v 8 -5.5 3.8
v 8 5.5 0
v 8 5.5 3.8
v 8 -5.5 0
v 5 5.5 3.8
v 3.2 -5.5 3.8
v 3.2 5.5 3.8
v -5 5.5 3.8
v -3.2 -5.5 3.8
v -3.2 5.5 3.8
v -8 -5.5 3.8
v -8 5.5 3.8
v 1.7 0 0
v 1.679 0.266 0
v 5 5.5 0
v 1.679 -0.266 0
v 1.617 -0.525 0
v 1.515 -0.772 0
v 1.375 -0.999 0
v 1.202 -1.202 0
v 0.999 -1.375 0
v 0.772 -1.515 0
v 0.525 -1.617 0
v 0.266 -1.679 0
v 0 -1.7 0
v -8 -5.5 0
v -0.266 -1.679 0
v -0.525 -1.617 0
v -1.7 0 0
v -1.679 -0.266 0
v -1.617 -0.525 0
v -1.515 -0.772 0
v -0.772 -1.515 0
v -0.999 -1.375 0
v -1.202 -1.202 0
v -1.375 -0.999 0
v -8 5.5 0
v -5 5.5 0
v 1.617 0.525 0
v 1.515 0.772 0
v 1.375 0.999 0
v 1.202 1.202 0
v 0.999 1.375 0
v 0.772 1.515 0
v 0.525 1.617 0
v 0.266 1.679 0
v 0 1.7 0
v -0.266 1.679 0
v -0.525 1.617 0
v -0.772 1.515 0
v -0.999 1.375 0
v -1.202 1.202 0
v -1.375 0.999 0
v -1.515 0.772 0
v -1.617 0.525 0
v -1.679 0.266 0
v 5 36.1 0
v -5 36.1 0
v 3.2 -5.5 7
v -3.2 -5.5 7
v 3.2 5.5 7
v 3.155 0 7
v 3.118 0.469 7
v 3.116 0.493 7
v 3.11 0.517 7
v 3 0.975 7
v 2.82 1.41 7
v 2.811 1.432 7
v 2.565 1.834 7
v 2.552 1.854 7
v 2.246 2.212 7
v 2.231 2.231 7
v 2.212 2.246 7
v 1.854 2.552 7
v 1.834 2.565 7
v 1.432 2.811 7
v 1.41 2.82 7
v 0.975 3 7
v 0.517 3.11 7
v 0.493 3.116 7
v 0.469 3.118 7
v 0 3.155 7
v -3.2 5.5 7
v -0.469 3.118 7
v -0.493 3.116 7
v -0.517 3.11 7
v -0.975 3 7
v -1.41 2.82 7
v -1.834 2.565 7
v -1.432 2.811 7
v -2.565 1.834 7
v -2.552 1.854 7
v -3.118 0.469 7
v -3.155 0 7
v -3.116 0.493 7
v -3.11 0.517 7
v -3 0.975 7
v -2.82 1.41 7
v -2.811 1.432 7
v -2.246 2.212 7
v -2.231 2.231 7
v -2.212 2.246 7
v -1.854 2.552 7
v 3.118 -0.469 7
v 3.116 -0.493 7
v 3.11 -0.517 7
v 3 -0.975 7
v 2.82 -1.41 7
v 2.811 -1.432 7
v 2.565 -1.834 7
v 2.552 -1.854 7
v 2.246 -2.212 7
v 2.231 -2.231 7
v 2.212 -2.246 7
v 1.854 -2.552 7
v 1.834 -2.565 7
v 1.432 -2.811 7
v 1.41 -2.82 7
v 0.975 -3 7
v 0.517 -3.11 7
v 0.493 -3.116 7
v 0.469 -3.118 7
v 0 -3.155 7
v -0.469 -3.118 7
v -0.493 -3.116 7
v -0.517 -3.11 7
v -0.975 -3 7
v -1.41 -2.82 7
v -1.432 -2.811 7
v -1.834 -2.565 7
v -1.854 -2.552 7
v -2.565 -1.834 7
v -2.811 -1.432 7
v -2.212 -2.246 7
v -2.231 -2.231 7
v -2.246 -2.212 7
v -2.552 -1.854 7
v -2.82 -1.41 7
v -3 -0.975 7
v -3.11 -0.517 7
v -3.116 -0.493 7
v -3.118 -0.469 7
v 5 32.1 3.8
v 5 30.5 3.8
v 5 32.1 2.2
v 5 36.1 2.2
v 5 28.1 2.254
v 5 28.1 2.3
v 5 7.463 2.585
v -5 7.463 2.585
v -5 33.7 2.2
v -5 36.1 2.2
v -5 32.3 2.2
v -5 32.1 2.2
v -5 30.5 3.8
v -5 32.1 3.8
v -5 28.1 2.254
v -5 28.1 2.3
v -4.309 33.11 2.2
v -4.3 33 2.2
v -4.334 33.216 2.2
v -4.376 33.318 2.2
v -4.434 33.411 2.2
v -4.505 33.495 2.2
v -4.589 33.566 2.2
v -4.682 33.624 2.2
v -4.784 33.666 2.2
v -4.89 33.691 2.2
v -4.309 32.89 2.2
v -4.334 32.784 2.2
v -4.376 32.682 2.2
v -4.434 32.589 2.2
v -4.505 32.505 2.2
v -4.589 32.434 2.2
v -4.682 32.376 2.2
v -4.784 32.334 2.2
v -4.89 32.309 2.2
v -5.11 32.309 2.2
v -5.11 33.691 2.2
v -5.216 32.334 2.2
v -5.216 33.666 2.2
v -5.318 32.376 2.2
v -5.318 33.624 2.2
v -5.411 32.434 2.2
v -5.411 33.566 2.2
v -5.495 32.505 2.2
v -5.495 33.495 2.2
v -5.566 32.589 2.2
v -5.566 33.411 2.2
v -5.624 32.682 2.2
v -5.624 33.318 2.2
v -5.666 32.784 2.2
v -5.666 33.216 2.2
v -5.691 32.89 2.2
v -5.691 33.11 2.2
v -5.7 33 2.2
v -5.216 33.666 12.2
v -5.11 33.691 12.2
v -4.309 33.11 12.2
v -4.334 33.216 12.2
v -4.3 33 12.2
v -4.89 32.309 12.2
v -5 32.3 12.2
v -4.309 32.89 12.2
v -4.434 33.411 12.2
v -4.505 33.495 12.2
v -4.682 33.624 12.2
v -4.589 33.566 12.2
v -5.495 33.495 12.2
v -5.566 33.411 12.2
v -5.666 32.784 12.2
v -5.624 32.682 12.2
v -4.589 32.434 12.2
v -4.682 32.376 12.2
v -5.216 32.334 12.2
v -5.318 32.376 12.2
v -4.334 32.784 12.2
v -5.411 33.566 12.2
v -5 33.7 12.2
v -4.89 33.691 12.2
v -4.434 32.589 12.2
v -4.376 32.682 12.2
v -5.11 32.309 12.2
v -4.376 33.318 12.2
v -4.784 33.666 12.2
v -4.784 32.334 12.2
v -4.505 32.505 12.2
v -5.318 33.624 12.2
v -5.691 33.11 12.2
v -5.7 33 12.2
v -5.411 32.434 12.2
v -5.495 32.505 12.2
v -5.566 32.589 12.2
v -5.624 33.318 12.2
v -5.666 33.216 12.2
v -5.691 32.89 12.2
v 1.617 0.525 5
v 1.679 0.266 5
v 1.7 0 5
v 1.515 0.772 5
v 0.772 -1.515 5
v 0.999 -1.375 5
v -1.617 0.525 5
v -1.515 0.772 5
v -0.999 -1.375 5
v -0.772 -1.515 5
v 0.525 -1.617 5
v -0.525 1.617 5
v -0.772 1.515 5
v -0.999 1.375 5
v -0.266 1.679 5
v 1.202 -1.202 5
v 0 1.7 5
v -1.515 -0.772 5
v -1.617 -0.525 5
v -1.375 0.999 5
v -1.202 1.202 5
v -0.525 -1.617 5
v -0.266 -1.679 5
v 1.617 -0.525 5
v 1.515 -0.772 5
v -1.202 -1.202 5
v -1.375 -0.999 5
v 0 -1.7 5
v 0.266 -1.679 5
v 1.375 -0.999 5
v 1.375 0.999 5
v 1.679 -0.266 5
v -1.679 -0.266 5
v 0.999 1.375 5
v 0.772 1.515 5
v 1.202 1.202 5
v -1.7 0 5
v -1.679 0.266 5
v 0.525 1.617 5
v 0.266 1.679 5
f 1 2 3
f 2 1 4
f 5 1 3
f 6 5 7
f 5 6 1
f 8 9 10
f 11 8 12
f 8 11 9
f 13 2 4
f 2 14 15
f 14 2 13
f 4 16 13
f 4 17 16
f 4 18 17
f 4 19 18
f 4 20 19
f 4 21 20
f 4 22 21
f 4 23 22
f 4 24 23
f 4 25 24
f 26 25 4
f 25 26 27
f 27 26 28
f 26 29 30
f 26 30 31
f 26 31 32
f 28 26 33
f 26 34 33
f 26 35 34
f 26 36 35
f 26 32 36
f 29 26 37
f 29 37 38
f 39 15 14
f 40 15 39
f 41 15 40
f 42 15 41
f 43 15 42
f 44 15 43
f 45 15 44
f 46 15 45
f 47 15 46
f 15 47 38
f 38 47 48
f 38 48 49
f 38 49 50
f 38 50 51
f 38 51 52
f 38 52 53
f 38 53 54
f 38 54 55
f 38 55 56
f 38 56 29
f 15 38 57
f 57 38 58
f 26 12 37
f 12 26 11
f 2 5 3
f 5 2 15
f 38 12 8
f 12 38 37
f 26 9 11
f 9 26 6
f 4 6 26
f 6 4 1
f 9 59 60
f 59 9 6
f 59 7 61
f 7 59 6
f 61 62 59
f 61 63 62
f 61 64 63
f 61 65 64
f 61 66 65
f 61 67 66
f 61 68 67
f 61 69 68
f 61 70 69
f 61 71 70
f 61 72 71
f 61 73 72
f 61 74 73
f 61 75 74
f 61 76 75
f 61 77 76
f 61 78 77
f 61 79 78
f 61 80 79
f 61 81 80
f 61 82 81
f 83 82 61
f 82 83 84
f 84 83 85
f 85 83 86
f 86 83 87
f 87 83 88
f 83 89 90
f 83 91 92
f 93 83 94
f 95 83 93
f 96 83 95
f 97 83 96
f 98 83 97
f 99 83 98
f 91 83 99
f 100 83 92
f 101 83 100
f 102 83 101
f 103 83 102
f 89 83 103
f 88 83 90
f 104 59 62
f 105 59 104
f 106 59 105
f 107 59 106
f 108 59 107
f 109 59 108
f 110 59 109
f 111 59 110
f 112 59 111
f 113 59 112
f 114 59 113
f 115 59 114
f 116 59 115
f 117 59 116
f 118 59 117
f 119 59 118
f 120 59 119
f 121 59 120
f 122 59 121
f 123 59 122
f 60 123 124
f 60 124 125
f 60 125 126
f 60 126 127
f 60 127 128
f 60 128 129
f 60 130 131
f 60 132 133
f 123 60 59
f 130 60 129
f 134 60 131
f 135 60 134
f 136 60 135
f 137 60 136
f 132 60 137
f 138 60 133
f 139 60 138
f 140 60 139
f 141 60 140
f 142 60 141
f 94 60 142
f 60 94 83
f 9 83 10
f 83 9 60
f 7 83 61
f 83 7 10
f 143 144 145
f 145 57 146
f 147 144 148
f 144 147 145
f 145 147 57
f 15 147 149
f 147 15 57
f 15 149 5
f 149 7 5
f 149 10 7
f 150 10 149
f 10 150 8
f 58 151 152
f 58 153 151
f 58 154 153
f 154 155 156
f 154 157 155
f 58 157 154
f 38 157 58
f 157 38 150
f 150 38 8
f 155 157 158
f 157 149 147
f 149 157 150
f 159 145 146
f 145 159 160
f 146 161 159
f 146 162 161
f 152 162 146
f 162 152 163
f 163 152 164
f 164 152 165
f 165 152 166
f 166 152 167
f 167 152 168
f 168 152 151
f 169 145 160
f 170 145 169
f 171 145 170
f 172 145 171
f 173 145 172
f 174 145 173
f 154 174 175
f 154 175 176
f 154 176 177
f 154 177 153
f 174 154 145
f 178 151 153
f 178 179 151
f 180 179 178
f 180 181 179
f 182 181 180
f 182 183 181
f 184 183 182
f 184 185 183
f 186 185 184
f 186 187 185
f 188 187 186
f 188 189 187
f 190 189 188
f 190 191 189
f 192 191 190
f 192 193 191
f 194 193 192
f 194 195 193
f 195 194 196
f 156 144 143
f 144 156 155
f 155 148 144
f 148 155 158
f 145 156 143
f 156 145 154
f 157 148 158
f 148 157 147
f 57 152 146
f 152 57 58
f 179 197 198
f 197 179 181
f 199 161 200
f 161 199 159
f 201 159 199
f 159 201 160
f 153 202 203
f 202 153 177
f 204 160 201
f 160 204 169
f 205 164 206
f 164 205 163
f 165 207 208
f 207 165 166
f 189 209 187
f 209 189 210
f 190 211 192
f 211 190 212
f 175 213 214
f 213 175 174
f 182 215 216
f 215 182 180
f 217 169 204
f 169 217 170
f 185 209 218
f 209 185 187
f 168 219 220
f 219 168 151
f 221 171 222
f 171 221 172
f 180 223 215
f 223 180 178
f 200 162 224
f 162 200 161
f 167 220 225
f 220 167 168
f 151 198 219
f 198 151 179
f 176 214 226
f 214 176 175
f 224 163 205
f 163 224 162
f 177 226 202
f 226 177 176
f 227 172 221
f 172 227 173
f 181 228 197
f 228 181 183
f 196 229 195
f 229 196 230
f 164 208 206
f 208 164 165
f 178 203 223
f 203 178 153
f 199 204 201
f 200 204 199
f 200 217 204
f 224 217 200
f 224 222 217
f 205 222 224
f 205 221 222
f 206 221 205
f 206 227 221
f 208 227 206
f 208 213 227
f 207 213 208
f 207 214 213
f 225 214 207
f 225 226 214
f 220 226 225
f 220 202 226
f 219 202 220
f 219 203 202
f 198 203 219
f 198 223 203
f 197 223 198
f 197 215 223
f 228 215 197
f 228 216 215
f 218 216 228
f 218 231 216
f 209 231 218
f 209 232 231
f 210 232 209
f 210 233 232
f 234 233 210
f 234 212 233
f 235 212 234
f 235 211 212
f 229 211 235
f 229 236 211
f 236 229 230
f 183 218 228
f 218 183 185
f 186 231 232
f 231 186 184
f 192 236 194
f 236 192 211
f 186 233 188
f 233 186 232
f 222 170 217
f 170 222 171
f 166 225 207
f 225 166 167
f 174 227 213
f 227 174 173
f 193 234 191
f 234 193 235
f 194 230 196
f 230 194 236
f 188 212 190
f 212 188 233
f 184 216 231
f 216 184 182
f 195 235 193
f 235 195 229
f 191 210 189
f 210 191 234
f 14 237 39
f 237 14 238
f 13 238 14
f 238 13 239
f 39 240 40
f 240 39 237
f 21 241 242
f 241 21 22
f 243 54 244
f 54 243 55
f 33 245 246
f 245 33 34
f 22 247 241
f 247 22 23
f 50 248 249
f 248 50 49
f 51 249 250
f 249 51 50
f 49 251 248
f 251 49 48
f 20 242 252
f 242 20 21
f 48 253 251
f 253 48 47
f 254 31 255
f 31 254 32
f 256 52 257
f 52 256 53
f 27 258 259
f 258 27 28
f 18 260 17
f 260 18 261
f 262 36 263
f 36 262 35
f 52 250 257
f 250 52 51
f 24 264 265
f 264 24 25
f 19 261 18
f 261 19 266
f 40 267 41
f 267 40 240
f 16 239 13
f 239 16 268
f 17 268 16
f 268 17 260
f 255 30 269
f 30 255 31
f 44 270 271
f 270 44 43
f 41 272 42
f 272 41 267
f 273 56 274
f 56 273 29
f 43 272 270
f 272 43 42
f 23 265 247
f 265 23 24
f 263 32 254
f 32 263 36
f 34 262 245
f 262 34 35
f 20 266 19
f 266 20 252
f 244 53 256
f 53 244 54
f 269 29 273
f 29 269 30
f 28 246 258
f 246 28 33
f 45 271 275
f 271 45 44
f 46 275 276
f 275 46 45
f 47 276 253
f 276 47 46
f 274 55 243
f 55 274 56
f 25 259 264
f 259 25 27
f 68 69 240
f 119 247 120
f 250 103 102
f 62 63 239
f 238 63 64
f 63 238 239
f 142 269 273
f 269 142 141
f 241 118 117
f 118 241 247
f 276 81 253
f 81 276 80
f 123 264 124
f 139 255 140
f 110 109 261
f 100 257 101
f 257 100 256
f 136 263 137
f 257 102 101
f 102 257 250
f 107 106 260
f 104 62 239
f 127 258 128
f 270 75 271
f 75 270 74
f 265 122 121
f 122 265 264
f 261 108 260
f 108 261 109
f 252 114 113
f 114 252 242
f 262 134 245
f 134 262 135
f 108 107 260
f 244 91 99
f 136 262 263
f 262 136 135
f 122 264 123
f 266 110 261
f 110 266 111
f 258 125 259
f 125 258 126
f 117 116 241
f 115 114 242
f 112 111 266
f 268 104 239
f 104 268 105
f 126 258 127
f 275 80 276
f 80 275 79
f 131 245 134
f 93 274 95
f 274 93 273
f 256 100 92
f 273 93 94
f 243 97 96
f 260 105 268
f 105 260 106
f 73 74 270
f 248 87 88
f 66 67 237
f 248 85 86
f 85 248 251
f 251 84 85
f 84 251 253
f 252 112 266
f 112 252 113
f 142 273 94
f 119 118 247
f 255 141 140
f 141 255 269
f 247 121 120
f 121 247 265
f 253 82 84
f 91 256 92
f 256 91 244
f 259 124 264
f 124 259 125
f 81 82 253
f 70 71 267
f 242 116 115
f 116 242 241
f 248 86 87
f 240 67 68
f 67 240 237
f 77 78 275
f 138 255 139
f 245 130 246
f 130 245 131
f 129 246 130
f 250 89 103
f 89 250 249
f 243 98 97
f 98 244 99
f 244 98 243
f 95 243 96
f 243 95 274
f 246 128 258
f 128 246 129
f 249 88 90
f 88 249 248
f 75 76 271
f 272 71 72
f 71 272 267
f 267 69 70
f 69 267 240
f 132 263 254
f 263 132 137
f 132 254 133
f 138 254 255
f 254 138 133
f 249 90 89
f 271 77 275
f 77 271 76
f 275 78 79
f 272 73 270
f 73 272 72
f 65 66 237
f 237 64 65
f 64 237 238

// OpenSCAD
$fn = 40;

module k2_snap_clip_modular_hardened() {
    difference() {
        union() {
            // 1. Chân đế trượt chữ T cài vừa khít vào rãnh plate
            translate([-8.0, -5.5, 0.0]) cube([16.0, 11.0, 3.8]);
            translate([-3.2, -5.5, 3.8]) cube([6.4, 11.0, 3.2]);
            
            // 2. Góc lượn chuyển tiếp R = 3.5mm giữa chân đế và đòn đàn hồi
            hull() {
                translate([-5.0, 4.0, 0.0]) cube([10.0, 1.5, 3.8]);
                translate([-5.0, 7.5, 0.0]) cube([10.0, 0.1, 2.5]);
            }
            
            // 3. Đòn đàn hồi dạng côn ứng suất đều (Uniform Stress Tapered Beam: 2.6mm ở gốc -> 2.2mm ở ngọn)
            //    In nằm phẳng Z=0: thớ nhựa chạy dọc liên tục 100% -> không bao giờ tách lớp!
            hull() {
                translate([-5.0, 5.5, 0.0]) cube([10.0, 1.0, 2.6]);
                translate([-5.0, 30.5, 0.0]) cube([10.0, 1.0, 2.2]);
            }
            
            // 4. Đầu móc ngàm khóa có vát 45° dẫn hướng ấn tách
            translate([-5.0, 30.5, 2.2])
                hull() {
                    cube([10.0, 1.6, 1.6]);
                    translate([0, -2.4, 0]) cube([10.0, 0.1, 0.1]);
                }
                
            // 5. Tai bấm ngón tay mở nhanh (Ergonomic Thumb Release Tab)
            translate([-5.0, 30.5, 0.0])
                hull() {
                    cube([10.0, 3.5, 2.2]);
                    translate([0, 5.5, 0]) cube([10.0, 0.1, 2.2]);
                }
            // Gờ chống trượt ngón tay
            translate([-5.0, 33.0, 2.2])
                cylinder(d=1.4, h=10.0);
        }
        // Lỗ ốc M3 tâm để siết khóa cứng định vị
        translate([0, 0, -1.0]) cylinder(d=3.4, h=12.0);
        // Hốc chìm nón 90° bắt vít M3 đầu dù/nón phẳng
        translate([0, 0, 5.0]) cylinder(d1=3.4, d2=6.6, h=2.2);
    }
}

k2_snap_clip_modular_hardened();
